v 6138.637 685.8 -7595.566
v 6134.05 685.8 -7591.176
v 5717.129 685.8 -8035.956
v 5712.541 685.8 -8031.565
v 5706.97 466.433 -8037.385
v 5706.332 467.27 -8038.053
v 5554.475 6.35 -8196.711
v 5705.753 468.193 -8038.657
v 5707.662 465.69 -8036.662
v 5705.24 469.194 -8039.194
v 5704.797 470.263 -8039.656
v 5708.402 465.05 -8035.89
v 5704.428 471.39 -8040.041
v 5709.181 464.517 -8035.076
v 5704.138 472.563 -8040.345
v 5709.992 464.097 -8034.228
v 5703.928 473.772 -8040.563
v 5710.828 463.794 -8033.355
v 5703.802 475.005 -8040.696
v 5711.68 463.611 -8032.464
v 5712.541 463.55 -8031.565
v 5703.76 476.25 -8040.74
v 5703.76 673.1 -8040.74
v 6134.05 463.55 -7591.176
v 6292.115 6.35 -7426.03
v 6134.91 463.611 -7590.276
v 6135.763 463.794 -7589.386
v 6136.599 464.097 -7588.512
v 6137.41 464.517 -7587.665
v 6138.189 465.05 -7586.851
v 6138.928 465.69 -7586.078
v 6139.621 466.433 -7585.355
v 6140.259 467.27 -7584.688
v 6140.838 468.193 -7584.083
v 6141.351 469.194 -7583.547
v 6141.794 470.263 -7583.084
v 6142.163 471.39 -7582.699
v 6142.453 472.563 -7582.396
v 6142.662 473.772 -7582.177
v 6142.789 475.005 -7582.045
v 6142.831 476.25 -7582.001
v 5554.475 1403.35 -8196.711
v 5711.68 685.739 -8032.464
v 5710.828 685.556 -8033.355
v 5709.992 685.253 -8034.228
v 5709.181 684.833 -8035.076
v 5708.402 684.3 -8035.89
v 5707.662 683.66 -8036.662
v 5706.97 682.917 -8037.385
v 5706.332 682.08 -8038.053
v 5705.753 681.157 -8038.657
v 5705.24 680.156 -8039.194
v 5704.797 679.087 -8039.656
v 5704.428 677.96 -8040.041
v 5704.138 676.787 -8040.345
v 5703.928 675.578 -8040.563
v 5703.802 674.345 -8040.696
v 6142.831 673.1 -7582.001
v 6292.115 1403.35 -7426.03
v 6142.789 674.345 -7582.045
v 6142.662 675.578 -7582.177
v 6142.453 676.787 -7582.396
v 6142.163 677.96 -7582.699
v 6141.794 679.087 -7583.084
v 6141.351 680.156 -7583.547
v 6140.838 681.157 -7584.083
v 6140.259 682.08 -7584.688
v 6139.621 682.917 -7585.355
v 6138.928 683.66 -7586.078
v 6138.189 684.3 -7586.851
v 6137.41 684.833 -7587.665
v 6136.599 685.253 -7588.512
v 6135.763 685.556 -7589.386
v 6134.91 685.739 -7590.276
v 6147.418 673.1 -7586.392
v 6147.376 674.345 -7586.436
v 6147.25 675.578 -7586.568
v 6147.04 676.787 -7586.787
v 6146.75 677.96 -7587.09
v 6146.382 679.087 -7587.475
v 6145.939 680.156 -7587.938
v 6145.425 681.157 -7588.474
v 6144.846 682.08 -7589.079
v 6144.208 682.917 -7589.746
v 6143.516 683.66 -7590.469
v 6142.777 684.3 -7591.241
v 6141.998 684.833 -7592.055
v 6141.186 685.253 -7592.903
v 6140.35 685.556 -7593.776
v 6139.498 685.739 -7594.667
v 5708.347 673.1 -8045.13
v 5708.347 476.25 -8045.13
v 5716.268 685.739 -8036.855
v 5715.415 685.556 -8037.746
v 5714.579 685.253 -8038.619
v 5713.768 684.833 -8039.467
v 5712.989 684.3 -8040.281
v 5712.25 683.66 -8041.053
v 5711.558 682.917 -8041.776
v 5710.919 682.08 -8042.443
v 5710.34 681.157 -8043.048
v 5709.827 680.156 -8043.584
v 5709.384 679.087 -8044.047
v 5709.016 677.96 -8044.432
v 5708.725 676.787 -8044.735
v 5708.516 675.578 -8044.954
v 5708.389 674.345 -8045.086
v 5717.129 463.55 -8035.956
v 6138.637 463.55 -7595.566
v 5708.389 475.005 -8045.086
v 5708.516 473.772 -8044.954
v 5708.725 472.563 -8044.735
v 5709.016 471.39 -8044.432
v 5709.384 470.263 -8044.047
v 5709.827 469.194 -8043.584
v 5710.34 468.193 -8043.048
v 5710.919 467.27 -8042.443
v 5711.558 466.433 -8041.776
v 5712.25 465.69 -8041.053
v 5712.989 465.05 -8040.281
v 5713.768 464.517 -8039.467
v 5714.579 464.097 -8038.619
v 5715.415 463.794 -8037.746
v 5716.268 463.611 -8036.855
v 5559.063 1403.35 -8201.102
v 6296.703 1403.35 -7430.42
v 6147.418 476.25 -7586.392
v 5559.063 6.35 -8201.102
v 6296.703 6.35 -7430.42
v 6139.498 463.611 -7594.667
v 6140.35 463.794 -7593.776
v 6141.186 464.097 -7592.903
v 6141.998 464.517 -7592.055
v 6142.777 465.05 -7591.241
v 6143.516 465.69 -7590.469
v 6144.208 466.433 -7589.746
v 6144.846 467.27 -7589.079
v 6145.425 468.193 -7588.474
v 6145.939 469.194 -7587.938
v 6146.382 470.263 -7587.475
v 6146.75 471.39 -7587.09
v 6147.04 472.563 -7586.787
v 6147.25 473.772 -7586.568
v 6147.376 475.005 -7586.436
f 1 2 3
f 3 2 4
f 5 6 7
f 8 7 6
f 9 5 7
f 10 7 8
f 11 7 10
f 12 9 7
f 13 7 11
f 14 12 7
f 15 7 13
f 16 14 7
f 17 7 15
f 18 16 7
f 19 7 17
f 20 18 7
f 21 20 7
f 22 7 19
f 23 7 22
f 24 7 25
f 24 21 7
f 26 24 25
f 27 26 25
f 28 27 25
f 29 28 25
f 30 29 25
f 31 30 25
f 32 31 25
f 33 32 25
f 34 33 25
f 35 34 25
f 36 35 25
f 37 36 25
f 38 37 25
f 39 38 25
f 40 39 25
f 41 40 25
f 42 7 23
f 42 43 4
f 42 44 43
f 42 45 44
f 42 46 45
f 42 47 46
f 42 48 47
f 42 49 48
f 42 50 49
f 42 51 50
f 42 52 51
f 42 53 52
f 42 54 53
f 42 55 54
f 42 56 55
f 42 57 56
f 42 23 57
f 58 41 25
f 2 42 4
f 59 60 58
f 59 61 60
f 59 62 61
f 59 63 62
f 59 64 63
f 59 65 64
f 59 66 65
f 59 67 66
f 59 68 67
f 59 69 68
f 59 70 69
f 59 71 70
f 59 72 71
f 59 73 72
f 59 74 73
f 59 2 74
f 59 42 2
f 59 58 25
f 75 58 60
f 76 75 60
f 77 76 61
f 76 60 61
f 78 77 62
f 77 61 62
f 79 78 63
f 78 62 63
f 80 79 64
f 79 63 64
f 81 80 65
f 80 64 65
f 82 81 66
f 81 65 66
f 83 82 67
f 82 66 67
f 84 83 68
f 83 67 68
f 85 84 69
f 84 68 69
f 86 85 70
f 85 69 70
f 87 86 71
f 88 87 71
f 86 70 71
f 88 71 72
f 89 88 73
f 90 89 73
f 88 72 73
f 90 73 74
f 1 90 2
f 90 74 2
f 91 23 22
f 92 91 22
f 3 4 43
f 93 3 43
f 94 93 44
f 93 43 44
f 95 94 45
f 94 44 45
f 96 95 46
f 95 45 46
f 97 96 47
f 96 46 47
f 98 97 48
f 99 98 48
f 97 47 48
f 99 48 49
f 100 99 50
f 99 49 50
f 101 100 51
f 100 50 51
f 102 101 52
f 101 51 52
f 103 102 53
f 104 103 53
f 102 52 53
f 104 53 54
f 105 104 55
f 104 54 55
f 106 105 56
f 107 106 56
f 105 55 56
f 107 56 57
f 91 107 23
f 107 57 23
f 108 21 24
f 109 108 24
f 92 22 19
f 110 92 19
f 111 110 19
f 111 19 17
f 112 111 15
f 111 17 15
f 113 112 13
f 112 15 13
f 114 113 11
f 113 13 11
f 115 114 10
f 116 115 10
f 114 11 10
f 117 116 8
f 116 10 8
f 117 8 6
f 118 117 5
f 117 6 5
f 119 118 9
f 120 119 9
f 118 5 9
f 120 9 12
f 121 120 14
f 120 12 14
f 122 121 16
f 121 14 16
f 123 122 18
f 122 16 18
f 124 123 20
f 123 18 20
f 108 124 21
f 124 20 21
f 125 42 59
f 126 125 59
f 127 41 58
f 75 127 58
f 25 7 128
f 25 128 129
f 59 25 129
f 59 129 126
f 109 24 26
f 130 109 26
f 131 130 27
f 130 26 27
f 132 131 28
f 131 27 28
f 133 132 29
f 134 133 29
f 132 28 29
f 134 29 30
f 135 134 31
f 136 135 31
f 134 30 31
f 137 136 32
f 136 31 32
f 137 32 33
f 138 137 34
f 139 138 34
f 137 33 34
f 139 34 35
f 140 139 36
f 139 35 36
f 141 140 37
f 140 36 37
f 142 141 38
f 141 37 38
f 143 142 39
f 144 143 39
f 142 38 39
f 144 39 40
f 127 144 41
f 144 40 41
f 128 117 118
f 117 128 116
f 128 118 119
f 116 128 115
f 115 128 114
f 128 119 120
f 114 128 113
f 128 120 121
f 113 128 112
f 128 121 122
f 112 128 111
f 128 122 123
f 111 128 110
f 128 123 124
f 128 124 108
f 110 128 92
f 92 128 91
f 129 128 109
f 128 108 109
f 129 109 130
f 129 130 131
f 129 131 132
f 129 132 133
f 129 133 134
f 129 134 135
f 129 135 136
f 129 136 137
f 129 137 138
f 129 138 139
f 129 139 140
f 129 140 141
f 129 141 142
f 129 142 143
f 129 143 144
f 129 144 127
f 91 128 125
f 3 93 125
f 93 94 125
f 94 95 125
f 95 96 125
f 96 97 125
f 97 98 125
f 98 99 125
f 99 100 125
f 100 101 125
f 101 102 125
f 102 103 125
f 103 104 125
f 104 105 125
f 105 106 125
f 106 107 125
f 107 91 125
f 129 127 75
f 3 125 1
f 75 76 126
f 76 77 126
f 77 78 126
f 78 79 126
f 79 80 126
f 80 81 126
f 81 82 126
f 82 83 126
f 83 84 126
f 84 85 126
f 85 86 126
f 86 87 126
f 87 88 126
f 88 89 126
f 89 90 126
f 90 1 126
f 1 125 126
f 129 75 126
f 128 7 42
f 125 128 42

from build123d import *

# Parameters (mm, degrees)
SKETCH1_W           = 1066.8
SKETCH1_H           = 1397
BOSS_EXTRUDE1_DEPTH = 6.35


with BuildPart() as part:
    # Sketch1 → Boss-Extrude1 (new body)
    with BuildSketch(Plane(origin=(6993.279954705, 0, -6693.457613122), x_dir=(0.6914509803921883, 0, 0.722423381207088), z_dir=(-0.722423381207088, 0, 0.6914509803921883))):
        with Locations((-1547.448135129, 704.85)):
            Rectangle(SKETCH1_W, SKETCH1_H)
        with BuildLine():
            Line((-1242.648135129, 685.8), (-1852.248135129, 685.8))
            ThreePointArc((-1852.248135129, 685.8), (-1861.22839125, 682.080256121), (-1864.948135129, 673.1))
            Line((-1864.948135129, 673.1), (-1864.948135129, 476.25))
            ThreePointArc((-1864.948135129, 476.25), (-1861.22839125, 467.269743879), (-1852.248135129, 463.55))
            Line((-1852.248135129, 463.55), (-1242.648135129, 463.55))
            ThreePointArc((-1242.648135129, 463.55), (-1233.667879008, 467.269743879), (-1229.948135129, 476.25))
            Line((-1229.948135129, 476.25), (-1229.948135129, 673.1))
            ThreePointArc((-1229.948135129, 673.1), (-1233.667879008, 682.080256121), (-1242.648135129, 685.8))
        make_face(mode=Mode.SUBTRACT)
    extrude(amount=-BOSS_EXTRUDE1_DEPTH)


solid = part.part
